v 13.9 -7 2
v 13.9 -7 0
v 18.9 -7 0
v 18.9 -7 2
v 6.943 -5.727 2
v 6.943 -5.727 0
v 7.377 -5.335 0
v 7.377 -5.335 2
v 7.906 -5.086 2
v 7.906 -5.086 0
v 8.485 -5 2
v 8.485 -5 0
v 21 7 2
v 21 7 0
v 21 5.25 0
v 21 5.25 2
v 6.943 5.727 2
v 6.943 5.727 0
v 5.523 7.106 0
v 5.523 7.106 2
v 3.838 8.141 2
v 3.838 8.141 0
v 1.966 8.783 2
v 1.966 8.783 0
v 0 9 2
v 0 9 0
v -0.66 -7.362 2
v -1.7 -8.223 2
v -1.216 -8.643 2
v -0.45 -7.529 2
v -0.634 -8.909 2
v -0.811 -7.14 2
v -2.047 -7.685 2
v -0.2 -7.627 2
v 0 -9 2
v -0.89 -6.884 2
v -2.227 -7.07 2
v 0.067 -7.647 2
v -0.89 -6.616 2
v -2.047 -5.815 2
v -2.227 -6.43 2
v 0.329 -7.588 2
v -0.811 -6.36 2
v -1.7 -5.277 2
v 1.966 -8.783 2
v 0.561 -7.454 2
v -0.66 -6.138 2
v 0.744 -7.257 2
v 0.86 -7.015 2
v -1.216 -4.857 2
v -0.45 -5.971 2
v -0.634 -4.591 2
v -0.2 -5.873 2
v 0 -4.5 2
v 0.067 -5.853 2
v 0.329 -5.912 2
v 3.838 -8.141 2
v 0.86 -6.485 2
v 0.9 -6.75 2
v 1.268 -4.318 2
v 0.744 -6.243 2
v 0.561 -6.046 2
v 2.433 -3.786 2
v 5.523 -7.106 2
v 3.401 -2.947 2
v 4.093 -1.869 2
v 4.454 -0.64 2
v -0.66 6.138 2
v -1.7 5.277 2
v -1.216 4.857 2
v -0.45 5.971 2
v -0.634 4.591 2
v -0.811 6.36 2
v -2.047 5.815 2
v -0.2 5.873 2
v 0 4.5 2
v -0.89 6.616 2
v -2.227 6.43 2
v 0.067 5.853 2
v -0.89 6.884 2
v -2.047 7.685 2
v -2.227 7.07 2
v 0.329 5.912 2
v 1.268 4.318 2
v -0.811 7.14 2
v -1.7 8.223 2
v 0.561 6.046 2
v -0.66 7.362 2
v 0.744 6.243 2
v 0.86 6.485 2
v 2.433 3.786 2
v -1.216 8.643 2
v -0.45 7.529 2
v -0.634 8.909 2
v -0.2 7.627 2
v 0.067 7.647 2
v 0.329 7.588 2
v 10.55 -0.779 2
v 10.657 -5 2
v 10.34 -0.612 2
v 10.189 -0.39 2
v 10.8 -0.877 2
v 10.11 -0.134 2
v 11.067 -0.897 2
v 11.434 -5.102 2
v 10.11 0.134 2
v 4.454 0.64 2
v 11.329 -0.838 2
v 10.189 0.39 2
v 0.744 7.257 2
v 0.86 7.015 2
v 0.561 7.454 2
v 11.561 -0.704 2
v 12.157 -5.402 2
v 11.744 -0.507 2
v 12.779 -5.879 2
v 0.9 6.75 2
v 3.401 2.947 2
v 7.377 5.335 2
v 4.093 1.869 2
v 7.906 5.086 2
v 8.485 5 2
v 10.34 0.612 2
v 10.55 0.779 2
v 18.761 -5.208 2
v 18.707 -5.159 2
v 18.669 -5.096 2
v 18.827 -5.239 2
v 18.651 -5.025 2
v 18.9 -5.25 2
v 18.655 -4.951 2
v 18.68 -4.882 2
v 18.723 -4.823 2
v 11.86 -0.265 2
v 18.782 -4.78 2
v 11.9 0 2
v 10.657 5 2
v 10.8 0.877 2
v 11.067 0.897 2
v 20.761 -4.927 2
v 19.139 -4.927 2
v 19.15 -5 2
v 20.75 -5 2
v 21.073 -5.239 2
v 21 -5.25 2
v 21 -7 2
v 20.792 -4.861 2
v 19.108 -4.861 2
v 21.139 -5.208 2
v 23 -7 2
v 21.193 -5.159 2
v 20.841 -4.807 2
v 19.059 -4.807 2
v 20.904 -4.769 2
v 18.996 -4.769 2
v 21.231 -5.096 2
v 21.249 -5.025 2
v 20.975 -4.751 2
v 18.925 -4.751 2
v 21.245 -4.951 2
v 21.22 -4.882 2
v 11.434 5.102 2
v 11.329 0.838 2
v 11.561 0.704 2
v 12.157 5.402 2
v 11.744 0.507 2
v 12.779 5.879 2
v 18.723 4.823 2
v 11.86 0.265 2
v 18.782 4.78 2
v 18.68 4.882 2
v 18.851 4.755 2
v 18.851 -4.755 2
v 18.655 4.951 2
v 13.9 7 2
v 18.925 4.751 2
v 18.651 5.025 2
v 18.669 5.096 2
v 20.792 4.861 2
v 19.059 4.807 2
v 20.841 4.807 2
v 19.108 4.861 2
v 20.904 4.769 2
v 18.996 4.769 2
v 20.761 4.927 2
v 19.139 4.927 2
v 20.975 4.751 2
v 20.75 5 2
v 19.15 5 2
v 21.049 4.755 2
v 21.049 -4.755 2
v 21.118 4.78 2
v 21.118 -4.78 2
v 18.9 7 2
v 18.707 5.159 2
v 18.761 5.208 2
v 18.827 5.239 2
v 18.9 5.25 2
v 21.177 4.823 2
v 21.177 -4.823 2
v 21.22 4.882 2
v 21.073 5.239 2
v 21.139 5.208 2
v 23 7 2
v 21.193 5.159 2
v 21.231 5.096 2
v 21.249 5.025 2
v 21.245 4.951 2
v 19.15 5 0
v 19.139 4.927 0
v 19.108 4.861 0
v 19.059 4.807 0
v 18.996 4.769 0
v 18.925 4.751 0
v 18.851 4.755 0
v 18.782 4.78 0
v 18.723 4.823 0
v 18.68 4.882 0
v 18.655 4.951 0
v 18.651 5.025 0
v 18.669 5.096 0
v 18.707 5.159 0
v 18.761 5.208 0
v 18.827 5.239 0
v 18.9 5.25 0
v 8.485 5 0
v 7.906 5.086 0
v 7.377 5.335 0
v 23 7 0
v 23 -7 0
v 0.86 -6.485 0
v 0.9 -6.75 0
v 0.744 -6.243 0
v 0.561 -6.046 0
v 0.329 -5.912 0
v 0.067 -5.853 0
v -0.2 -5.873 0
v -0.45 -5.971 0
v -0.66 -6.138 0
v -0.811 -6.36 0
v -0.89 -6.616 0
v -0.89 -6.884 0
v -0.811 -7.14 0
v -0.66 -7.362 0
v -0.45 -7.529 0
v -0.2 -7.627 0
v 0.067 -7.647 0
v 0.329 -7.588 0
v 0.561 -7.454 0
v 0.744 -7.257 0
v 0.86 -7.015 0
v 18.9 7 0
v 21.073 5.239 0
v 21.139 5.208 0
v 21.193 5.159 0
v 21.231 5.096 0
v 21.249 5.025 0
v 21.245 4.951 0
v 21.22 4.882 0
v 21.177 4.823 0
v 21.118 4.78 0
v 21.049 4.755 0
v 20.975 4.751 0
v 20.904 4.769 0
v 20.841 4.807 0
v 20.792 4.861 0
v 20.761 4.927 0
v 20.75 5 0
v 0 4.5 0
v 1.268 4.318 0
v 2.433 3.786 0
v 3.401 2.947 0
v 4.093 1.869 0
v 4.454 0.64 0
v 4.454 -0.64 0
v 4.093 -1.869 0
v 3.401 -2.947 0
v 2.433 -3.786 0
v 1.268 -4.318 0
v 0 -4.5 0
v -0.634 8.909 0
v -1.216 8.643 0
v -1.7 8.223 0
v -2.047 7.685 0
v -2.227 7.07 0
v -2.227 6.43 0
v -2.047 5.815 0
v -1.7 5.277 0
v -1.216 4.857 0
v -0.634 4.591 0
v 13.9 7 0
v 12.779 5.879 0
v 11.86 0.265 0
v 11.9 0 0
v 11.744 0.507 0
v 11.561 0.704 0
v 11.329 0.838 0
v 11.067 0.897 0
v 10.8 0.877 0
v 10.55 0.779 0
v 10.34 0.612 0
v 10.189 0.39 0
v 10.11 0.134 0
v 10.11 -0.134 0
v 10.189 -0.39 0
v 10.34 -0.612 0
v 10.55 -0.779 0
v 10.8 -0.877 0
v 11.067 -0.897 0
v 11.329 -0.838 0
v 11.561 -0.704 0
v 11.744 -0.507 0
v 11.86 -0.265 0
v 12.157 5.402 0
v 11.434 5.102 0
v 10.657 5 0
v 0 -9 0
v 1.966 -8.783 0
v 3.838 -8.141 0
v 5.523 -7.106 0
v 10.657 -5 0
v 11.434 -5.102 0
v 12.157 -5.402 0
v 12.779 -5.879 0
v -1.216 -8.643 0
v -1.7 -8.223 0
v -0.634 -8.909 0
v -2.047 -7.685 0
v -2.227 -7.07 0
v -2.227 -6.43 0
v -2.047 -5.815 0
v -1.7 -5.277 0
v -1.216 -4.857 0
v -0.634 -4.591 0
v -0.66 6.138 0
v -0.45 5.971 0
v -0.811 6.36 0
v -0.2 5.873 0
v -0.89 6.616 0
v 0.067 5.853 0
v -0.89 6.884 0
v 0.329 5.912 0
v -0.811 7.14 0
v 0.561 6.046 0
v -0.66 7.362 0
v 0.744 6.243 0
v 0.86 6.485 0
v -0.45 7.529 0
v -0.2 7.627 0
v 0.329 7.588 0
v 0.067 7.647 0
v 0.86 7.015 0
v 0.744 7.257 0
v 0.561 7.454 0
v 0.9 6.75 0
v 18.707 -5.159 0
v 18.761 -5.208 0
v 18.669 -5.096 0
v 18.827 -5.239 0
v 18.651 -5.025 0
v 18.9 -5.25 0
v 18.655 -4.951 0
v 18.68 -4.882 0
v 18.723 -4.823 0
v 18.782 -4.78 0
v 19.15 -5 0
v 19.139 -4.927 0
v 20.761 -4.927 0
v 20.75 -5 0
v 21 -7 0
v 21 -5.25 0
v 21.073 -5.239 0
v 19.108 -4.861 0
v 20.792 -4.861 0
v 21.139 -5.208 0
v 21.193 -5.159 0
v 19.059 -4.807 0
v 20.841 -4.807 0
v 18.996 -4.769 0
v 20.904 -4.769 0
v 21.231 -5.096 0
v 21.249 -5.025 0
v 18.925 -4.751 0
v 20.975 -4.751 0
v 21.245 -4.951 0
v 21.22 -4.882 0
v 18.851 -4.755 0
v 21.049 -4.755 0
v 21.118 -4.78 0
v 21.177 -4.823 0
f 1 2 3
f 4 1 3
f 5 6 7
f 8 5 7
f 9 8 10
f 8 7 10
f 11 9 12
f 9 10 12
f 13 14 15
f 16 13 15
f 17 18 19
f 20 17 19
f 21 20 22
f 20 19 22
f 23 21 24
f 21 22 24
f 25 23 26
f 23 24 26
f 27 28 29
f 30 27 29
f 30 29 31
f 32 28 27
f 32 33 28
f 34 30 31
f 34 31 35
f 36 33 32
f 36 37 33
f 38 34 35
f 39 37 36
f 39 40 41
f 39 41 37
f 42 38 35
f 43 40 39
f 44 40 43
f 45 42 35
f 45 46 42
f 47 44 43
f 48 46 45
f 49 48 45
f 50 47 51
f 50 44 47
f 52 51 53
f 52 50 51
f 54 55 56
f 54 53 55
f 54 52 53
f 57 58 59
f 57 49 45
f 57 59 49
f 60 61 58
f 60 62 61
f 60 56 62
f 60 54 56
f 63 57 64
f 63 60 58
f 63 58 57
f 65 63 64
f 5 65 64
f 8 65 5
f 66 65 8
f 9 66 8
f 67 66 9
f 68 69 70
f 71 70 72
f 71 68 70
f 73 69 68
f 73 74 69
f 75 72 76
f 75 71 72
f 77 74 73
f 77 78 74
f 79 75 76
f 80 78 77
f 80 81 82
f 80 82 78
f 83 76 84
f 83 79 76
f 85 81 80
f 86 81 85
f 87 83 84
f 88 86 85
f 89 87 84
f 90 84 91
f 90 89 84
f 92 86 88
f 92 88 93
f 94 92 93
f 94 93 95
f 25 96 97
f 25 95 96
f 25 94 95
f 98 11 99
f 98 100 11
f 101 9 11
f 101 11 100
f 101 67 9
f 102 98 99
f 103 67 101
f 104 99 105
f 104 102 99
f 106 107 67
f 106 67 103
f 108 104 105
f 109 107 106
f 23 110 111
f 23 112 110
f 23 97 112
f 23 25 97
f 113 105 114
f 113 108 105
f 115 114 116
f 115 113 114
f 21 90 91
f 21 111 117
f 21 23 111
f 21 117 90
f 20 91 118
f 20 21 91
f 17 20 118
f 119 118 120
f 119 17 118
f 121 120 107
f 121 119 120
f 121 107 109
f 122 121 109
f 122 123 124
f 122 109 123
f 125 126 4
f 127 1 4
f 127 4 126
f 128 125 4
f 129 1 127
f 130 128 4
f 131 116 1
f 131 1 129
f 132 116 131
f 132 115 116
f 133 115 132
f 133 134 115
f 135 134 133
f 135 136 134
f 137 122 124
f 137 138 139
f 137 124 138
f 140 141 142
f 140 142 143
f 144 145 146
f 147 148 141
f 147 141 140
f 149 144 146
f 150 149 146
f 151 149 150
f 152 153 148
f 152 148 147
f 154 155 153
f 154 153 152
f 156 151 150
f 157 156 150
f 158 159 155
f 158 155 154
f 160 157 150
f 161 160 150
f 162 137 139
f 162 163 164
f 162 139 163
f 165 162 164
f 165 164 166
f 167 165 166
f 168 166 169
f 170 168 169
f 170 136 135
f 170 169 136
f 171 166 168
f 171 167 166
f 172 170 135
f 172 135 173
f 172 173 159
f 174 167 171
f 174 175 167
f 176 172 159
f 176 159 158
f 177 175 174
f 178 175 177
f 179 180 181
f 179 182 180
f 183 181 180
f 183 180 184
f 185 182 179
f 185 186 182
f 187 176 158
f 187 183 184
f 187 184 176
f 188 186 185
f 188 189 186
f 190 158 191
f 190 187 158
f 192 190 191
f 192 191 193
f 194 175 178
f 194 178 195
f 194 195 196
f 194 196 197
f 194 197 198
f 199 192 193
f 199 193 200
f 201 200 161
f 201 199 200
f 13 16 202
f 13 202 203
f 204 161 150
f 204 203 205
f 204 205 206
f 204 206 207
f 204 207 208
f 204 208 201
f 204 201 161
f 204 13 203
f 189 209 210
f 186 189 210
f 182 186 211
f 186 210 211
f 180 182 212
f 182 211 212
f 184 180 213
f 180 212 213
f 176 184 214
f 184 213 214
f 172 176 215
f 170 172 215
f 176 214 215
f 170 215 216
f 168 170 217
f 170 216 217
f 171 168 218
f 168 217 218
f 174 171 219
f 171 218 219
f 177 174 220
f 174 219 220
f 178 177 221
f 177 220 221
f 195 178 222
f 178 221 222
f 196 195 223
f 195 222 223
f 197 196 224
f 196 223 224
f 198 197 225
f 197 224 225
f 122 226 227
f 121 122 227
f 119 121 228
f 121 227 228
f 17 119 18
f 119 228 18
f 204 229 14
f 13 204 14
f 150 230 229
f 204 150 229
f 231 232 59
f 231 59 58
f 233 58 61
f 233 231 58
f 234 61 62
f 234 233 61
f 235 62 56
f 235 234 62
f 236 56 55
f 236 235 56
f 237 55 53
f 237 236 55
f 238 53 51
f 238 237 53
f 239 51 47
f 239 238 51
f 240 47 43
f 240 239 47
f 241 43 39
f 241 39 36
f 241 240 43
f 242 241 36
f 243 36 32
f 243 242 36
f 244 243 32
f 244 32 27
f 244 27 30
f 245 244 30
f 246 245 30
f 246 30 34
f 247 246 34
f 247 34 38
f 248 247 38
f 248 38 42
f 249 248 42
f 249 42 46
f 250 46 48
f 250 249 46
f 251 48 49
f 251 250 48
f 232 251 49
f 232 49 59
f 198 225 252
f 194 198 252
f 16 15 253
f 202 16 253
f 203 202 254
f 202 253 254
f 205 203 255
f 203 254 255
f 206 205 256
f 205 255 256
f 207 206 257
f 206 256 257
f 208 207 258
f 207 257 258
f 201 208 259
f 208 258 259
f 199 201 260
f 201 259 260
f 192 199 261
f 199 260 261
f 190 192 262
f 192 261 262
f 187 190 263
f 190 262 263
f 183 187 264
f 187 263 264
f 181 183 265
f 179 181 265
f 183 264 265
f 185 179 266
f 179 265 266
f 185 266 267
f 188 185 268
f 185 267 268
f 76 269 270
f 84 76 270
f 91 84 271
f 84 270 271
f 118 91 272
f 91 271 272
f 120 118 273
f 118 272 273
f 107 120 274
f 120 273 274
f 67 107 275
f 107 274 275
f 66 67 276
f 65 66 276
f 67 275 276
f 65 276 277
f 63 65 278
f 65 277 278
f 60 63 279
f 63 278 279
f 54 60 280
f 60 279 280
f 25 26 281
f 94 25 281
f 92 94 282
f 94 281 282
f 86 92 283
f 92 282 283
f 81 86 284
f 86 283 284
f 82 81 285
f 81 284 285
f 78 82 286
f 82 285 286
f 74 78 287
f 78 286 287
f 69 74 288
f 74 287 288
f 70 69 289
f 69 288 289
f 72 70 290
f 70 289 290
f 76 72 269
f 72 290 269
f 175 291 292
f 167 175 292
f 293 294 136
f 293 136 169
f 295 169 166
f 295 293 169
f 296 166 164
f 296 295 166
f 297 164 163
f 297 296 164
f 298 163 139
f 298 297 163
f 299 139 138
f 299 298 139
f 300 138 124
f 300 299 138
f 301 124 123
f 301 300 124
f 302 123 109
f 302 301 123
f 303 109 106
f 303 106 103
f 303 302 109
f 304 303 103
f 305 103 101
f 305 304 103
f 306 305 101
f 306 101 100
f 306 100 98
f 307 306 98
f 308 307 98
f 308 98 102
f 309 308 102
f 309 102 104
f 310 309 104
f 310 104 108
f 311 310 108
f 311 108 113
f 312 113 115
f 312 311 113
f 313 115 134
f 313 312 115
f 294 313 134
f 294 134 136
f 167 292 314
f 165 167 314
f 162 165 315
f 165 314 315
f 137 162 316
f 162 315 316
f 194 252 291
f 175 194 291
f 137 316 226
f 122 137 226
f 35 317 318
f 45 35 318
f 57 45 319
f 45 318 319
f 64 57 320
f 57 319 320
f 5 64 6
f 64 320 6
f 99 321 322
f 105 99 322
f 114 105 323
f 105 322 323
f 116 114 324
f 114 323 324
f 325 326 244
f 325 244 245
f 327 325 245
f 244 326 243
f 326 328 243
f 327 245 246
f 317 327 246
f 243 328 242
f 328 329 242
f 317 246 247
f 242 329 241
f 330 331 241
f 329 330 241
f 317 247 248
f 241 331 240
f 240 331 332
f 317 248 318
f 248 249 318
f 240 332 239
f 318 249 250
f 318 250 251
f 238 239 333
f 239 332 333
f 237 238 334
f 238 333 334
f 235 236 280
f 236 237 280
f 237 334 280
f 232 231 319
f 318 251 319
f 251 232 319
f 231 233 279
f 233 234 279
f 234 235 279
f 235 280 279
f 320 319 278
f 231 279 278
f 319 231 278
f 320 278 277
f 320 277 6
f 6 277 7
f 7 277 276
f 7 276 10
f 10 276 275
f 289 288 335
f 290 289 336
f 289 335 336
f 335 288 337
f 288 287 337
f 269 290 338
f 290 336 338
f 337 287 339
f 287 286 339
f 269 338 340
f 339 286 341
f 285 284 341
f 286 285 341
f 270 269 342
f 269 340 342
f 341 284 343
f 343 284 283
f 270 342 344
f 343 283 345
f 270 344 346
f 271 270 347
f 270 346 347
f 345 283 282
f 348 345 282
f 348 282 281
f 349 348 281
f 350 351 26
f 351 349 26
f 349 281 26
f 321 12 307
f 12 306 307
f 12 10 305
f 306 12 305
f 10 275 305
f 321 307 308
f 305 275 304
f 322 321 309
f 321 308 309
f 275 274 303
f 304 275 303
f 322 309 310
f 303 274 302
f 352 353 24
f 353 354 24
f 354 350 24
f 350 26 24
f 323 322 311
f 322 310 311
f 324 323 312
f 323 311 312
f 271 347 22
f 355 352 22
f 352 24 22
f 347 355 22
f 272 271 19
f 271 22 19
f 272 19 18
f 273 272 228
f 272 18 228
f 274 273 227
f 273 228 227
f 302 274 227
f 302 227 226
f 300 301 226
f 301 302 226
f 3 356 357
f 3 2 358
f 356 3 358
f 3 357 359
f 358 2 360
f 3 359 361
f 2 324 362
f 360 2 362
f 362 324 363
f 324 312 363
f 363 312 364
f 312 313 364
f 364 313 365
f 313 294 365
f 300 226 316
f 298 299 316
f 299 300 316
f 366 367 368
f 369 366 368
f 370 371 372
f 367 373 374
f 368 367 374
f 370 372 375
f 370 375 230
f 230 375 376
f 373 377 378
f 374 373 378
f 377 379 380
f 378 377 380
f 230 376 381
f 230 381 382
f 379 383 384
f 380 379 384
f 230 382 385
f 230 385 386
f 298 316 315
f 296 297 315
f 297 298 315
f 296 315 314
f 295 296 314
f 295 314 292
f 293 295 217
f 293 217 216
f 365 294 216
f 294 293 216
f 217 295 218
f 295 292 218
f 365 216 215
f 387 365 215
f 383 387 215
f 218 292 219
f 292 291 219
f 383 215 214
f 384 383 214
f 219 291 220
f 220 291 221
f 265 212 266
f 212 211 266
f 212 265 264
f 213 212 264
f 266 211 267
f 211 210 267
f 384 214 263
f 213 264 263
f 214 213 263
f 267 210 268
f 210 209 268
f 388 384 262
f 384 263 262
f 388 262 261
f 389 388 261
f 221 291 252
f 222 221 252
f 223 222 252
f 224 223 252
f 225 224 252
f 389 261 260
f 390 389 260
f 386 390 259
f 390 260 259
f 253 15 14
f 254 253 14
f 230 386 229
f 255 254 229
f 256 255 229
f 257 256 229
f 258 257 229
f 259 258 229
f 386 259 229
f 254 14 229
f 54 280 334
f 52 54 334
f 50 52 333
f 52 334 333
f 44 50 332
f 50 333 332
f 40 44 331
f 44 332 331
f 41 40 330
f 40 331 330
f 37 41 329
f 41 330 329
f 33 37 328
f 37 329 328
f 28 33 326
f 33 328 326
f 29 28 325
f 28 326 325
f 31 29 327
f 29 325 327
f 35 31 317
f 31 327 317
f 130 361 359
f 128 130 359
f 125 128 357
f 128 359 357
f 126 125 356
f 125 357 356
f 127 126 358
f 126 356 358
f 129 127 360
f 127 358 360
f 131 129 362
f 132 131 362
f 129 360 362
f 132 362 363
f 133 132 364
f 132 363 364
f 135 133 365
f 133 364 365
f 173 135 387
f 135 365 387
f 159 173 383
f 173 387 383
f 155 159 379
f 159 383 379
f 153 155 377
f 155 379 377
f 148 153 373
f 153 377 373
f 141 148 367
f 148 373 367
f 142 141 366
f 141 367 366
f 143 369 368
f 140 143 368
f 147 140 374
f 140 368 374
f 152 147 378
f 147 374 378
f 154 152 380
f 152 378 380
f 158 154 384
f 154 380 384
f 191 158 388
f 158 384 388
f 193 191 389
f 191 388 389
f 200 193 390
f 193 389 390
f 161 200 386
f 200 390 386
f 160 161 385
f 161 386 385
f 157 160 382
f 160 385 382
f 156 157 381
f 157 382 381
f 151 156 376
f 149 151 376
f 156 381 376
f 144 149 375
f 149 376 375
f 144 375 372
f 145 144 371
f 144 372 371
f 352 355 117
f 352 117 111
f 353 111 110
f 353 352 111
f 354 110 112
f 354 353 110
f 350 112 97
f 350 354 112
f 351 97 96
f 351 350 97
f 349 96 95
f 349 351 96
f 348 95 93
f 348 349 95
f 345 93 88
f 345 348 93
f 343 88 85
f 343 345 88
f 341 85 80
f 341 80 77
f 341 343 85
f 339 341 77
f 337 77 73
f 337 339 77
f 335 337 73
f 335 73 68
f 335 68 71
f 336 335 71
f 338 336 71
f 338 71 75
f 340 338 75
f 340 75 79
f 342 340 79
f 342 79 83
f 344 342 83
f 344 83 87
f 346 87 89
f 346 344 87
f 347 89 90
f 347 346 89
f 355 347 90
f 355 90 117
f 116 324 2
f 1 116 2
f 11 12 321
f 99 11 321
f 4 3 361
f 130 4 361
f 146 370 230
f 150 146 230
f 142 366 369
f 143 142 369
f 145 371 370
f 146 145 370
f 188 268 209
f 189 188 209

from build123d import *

# Parameters (mm, degrees)
SKETCH_1_R      = 0.9
EXTRUDE_1_DEPTH = 2


with BuildPart() as part:
    # 草图1 → 凸台-拉伸1 (new body)
    with BuildSketch(Plane.XY):
        with BuildLine():
            Line((8.485281374, -5), (10.657359313, -5))
            ThreePointArc((10.657359313, -5), (11.80540961, -5.228361402), (12.778679656, -5.878679656))
            Line((12.778679656, -5.878679656), (13.9, -7))
            Line((13.9, -7), (18.9, -7))
            Line((18.9, -7), (18.9, -5.25))
            ThreePointArc((18.9, -5.25), (18.723223305, -4.823223305), (19.15, -5))
            Line((19.15, -5), (20.75, -5))
            ThreePointArc((20.75, -5), (21.176776695, -4.823223305), (21, -5.25))
            Line((21, -5.25), (21, -7))
            Line((21, -7), (23, -7))
            Line((23, -7), (23, 7))
            Line((23, 7), (21, 7))
            Line((21, 7), (21, 5.25))
            ThreePointArc((21, 5.25), (21.176776695, 4.823223305), (20.75, 5))
            Line((20.75, 5), (19.15, 5))
            ThreePointArc((19.15, 5), (18.723223305, 4.823223305), (18.9, 5.25))
            Line((18.9, 5.25), (18.9, 7))
            Line((18.9, 7), (13.9, 7))
            Line((13.9, 7), (12.778679656, 5.878679656))
            ThreePointArc((12.778679656, 5.878679656), (11.80540961, 5.228361402), (10.657359313, 5))
            Line((10.657359313, 5), (8.485281374, 5))
            ThreePointArc((8.485281374, 5), (7.632478509, 5.190931933), (6.942502943, 5.727272727))
            ThreePointArc((6.942502943, 5.727272727), (3.837612894, 8.140806304), (0, 9))
            ThreePointArc((0, 9), (-2.25, 6.75), (0, 4.5))
            ThreePointArc((0, 4.5), (4.5, 0), (0, -4.5))
            ThreePointArc((0, -4.5), (-2.25, -6.75), (0, -9))
            ThreePointArc((0, -9), (3.837612894, -8.140806304), (6.942502943, -5.727272727))
            ThreePointArc((6.942502943, -5.727272727), (7.632478509, -5.190931933), (8.485281374, -5))
        make_face()
        with Locations((0, 6.75)):
            Circle(SKETCH_1_R, mode=Mode.SUBTRACT)
        with Locations((0, -6.75)):
            Circle(SKETCH_1_R, mode=Mode.SUBTRACT)
        with Locations((11, 0)):
            Circle(SKETCH_1_R, mode=Mode.SUBTRACT)
    extrude(amount=EXTRUDE_1_DEPTH)


solid = part.part
